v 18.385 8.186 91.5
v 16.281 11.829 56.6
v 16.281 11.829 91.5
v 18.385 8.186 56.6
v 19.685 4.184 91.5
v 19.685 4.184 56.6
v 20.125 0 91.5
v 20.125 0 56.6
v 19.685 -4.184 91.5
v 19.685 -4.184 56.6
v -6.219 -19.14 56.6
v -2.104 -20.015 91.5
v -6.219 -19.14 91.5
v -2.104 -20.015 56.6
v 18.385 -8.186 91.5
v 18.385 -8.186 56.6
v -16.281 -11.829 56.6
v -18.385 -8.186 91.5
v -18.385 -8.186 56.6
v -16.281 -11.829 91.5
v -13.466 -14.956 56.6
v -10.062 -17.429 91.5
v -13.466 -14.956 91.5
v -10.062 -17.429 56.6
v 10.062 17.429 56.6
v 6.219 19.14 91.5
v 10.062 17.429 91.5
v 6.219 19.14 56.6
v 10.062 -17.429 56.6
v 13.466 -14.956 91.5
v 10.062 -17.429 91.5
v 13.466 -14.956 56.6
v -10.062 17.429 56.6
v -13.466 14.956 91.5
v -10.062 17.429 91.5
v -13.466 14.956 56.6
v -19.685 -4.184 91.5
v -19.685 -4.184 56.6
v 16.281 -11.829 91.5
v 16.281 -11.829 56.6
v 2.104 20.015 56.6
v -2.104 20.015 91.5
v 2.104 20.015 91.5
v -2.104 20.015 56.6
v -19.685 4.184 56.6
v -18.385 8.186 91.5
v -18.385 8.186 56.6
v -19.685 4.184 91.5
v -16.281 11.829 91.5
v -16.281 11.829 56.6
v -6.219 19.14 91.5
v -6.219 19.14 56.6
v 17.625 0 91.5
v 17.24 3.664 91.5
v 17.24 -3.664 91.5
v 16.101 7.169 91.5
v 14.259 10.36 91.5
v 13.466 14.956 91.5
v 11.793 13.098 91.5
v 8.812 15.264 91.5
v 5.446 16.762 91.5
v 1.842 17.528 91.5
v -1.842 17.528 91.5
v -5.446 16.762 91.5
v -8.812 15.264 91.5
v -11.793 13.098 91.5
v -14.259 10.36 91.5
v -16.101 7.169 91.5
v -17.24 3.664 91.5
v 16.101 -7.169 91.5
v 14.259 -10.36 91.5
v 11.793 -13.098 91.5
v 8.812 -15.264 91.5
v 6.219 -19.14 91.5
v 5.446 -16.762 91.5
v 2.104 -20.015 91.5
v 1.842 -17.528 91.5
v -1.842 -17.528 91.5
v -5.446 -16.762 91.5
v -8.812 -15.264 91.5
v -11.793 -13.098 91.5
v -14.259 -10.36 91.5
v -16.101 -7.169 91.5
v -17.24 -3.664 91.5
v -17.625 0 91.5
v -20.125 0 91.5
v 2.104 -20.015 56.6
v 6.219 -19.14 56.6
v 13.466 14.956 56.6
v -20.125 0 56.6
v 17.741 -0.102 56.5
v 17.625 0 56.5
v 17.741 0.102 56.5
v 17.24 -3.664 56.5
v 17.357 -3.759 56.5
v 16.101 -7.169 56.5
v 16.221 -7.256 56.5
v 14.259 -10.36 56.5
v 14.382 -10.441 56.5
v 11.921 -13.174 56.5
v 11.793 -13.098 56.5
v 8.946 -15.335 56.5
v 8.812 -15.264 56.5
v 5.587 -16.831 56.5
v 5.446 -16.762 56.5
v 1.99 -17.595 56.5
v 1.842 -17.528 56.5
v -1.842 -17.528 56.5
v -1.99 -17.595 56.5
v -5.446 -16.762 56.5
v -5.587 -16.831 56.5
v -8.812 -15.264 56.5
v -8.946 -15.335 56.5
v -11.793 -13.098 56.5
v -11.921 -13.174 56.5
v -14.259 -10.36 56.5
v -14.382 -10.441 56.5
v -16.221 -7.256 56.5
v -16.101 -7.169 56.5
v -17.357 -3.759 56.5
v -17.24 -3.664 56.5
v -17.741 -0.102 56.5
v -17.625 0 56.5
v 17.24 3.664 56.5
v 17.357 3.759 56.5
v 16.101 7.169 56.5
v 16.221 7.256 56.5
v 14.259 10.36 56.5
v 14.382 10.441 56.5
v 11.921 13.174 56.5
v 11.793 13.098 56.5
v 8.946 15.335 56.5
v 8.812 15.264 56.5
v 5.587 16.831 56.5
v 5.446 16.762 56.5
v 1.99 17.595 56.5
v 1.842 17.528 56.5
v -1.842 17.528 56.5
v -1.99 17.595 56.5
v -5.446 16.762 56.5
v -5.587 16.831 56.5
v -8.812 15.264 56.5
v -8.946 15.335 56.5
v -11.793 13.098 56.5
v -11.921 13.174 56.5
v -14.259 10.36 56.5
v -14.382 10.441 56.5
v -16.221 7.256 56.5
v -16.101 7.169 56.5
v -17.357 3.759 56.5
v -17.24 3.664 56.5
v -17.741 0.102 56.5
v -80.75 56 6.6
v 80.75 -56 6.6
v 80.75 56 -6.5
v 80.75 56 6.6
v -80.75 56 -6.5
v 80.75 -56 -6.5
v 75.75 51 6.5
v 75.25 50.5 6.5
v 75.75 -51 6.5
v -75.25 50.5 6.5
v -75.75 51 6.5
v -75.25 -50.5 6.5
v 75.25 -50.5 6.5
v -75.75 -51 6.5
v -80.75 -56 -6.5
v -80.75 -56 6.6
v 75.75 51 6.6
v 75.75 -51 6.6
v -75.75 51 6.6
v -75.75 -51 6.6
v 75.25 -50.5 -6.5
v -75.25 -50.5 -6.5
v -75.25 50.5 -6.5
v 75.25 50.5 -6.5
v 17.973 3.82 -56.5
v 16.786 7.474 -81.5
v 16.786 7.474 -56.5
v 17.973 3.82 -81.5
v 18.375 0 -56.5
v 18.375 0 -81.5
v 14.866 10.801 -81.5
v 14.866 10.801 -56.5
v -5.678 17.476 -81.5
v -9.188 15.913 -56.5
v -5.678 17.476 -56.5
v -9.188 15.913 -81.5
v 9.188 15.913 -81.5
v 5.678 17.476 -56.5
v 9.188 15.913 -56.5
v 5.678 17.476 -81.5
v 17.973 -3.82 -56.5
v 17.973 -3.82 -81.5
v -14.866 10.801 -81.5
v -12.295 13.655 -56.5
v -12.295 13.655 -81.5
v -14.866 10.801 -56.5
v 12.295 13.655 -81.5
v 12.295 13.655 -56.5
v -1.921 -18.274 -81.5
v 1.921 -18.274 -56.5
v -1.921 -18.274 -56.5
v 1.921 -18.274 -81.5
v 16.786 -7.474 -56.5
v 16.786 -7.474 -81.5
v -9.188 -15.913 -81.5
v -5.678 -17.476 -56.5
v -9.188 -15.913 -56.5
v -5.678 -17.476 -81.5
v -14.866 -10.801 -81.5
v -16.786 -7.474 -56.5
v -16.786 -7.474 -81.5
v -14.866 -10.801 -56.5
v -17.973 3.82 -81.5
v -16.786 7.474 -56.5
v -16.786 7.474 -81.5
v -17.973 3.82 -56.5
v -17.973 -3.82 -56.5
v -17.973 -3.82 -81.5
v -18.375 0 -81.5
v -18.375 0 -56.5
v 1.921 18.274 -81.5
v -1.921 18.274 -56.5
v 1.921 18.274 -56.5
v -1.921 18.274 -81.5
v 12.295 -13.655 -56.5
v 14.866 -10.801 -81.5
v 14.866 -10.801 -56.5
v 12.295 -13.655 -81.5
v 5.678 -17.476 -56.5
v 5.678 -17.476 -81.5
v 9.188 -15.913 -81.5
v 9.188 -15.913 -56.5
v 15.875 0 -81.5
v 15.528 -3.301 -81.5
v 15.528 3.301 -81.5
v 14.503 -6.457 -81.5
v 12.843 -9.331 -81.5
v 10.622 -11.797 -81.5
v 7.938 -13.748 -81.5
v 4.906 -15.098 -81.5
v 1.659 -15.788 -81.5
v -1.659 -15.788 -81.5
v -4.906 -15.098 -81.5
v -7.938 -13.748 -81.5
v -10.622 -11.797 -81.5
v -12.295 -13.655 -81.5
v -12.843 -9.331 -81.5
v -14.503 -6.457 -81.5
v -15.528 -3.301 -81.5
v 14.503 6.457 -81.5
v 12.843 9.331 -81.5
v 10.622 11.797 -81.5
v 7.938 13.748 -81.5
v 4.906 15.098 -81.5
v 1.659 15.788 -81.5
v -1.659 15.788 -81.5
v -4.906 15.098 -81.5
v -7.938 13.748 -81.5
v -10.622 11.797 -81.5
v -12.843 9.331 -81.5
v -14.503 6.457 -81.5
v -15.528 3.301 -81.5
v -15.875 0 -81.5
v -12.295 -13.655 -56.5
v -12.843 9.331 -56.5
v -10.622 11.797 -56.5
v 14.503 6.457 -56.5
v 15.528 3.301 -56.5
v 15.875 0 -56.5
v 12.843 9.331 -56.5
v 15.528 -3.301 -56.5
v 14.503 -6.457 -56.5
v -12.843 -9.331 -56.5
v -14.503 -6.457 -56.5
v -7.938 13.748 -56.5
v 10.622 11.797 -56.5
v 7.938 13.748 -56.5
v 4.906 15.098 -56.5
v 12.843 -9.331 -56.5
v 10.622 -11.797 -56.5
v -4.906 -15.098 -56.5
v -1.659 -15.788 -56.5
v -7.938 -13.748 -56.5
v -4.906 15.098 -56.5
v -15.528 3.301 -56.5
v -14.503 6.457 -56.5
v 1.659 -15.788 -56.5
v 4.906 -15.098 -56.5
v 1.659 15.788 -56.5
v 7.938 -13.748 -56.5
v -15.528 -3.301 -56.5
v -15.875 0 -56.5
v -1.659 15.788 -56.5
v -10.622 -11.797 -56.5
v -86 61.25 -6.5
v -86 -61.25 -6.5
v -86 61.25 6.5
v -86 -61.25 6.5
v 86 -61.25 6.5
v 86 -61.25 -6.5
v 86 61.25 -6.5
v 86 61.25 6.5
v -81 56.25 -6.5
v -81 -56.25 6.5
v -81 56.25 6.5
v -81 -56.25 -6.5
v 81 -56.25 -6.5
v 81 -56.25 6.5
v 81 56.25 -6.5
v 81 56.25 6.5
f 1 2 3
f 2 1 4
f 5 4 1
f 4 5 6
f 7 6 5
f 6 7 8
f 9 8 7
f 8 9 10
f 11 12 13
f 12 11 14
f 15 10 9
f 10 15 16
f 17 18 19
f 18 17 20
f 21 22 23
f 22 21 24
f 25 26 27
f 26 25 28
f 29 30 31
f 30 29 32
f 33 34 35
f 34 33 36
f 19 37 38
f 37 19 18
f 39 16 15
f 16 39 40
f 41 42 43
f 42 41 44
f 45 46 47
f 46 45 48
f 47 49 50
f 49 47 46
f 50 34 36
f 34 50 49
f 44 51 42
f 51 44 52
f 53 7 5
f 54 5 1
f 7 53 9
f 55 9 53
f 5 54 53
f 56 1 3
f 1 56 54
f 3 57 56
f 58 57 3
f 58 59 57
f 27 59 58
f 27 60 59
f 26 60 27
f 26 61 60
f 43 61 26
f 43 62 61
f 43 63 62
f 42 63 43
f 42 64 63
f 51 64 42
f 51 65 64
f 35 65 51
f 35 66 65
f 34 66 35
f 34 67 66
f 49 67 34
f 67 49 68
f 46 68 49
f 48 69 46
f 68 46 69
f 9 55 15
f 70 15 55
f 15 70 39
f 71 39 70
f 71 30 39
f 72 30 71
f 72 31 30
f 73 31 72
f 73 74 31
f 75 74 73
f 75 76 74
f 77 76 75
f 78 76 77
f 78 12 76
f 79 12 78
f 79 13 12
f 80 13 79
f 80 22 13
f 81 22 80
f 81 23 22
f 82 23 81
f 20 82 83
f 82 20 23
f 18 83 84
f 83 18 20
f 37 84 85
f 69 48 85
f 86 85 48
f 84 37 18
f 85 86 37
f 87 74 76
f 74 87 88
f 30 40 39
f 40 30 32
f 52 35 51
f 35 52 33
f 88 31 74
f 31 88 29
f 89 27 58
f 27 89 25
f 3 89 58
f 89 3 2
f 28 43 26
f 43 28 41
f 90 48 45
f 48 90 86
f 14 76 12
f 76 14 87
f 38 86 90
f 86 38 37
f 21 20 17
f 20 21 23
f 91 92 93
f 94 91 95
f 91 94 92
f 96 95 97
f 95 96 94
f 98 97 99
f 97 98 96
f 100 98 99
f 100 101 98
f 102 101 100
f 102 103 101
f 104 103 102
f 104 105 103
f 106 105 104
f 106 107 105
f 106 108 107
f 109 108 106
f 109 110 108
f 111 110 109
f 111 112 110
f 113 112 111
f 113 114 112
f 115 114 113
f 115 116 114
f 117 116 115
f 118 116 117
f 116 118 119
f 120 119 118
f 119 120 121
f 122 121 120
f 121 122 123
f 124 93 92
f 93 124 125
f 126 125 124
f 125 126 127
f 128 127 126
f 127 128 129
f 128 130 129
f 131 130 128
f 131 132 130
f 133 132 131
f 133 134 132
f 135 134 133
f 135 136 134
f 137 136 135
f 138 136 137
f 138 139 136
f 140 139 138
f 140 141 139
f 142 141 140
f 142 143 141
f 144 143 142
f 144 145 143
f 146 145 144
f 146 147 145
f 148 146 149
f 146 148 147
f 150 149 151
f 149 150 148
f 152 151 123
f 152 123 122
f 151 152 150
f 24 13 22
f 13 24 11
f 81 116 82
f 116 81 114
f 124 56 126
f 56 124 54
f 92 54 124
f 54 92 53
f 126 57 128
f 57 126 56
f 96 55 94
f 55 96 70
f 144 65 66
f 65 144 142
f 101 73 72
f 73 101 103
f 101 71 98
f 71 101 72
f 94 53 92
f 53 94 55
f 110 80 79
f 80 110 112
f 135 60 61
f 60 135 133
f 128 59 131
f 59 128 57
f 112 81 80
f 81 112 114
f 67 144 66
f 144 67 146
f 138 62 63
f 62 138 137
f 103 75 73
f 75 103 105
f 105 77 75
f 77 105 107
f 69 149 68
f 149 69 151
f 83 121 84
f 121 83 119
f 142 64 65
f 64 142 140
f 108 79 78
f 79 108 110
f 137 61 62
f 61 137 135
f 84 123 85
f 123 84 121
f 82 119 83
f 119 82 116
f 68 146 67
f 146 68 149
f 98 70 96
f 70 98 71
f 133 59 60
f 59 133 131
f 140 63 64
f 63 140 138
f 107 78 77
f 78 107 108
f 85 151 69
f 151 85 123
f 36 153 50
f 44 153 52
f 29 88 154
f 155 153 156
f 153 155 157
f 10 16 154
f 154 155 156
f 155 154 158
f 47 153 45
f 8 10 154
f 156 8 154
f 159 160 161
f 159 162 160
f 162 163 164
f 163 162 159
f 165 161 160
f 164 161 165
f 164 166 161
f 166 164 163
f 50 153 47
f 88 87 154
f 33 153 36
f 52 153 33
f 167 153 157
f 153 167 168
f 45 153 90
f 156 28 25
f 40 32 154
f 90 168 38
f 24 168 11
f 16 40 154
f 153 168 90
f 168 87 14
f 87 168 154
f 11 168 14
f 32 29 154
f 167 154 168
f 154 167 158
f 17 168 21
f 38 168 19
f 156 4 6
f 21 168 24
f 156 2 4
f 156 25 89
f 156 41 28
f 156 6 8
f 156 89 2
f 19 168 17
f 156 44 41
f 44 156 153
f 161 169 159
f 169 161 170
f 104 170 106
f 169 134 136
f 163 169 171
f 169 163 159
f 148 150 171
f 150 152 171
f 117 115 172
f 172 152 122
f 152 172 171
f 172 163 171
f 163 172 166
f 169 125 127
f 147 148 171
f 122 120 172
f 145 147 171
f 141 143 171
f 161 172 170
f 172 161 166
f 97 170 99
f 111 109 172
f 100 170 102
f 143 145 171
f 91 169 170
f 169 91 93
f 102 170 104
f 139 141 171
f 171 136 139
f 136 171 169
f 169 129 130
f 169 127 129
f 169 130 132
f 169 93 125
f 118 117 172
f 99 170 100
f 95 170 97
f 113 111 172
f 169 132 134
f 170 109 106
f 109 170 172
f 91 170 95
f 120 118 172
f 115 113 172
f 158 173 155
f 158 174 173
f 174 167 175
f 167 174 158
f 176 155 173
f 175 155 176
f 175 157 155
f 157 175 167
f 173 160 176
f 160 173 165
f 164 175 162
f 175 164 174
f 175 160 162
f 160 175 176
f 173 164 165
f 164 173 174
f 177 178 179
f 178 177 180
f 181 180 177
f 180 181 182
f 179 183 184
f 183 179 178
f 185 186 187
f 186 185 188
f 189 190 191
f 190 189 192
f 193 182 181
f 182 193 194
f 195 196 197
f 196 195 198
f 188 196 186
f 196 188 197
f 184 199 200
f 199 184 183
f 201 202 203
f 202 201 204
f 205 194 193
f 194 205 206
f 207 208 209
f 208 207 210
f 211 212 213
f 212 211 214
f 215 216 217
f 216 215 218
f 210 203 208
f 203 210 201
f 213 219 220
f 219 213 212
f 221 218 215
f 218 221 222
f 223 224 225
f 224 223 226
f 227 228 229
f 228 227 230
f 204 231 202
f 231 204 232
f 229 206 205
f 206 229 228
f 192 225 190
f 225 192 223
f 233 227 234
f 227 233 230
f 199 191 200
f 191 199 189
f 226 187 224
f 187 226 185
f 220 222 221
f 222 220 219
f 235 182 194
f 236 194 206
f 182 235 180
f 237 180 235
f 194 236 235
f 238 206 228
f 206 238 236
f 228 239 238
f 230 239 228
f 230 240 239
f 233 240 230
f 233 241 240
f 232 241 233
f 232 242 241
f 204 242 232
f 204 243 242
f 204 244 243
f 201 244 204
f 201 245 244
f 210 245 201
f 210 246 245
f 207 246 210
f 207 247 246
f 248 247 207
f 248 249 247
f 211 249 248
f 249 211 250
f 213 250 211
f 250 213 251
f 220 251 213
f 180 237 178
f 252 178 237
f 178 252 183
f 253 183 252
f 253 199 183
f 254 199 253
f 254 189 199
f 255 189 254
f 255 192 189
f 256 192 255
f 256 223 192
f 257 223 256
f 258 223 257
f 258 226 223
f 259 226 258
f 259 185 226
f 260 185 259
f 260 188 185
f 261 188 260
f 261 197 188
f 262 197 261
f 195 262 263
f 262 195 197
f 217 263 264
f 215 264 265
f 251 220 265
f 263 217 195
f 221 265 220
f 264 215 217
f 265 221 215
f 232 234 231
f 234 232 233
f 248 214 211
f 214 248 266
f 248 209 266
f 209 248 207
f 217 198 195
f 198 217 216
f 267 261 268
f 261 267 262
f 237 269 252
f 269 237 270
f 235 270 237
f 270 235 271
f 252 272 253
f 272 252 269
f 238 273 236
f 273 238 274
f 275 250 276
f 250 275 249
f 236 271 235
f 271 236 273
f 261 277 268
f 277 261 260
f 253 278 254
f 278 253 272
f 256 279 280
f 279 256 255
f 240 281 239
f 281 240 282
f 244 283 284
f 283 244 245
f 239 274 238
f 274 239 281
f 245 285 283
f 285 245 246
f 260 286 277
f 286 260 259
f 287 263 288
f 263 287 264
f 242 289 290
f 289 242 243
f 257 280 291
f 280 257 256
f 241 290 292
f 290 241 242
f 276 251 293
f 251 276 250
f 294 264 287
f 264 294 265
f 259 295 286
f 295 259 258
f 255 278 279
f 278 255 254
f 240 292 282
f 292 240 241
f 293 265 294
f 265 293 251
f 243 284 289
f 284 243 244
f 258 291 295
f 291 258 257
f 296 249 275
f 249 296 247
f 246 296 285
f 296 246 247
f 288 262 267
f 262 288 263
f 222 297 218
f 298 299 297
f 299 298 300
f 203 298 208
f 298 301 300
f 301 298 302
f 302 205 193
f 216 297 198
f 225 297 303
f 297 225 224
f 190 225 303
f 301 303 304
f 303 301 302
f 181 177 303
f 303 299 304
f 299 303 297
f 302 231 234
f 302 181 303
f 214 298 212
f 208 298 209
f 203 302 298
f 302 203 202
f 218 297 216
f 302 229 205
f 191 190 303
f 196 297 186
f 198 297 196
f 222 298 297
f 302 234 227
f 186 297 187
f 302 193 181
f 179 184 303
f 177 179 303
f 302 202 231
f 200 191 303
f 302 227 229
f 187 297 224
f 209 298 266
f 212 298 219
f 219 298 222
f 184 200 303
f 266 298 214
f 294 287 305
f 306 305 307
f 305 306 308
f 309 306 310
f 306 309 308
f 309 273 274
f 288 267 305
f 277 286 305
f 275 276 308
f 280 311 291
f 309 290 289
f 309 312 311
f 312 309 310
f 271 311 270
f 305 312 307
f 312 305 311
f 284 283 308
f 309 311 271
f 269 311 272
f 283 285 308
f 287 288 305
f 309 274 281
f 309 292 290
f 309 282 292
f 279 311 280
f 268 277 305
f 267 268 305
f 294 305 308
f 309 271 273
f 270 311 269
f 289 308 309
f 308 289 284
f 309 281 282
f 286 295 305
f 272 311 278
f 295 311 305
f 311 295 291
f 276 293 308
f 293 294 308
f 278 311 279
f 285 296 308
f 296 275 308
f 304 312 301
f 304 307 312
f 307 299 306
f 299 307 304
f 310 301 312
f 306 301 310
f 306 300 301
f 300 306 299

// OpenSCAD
// my second parametric OpenSCAD project, making a
// filter holder for a dust collection vacuum hose
// set the inlet and outlet diameters, use 45 degree slope
// to provide easy no-supports printing
render_filter_cube = false;
render_inlet = true;
render_outlet = true;
filter_length = 150.5;
filter_width = 101;
filter_thickness = 13;
wall_thickness = 5;
gap_for_filter_length = 1;
gap_for_filter_width = 1;
length_of_transition_on_inlet = 50; // non-zero or it won't render
length_of_transition_on_outlet = 50; // non-zero or it won't render
gap_between_input_and_output = 0.5;

inlet_outer_dia = 40.25;
inlet_inner_dia = 35.25;
inlet_length = 35;
outlet_outer_dia = 36.75;
outlet_inner_dia = 31.75;
outlet_length = 25;

inlet_outer_radius = inlet_outer_dia / 2.0;
inlet_inner_radius = inlet_inner_dia / 2.0;
outlet_outer_radius = outlet_outer_dia / 2.0;
outlet_inner_radius = outlet_inner_dia / 2.0;
// calculate the wall angle so it can be made thicker to compensate for the slope
filter_length_opening = filter_length + gap_for_filter_length;
filter_width_opening = filter_width + gap_for_filter_width;
inlet_surround_length = filter_length_opening + 2*wall_thickness;
inlet_surround_width = filter_width_opening + 2*wall_thickness;
inlet_surround_height = filter_thickness;
inlet_side_length = filter_length_opening + 2*wall_thickness;
inlet_side_width = filter_width_opening + 2*wall_thickness;
outlet_side_length = inlet_side_length + gap_between_input_and_output;
outlet_side_width = inlet_side_width + gap_between_input_and_output;
outlet_outside_length = outlet_side_length + 2*wall_thickness;
outlet_outside_width = outlet_side_width + 2*wall_thickness;
outlet_surround_height = filter_thickness;
// slope_ratio gives the z distance traveled for a given
// distance change in the x/y directions

if (render_filter_cube) {
    translate([-0.5*filter_length,-0.5*filter_width,-0.5*filter_thickness]) cube([filter_length,filter_width,filter_thickness]);
}

if (render_inlet) {
    // inlet
    translate([0, 0, (length_of_transition_on_inlet + filter_thickness/2)]) {
        difference() {
            cylinder(inlet_length, inlet_outer_radius, inlet_outer_radius);
            cylinder(inlet_length, inlet_inner_radius, inlet_inner_radius);
        }
    }
    // transition to filter
    translate([0,0,(filter_thickness/2)])
    difference() {
        hull() {
            translate([-0.5*inlet_side_length,-0.5*inlet_side_width,0]) cube([inlet_side_length,inlet_side_width,.1]);
            translate([0,0,length_of_transition_on_inlet]) cylinder(r=inlet_outer_radius,h=0.1);
        }
        hull() {
            translate([-0.5*filter_length_opening,-0.5*filter_width_opening,0]) cube([filter_length_opening,filter_width_opening,.1]);
            translate([0,0,length_of_transition_on_inlet]) cylinder(r=inlet_inner_radius,h=0.1);
        }
    }
    // surround the filter
    difference() {
        translate([-0.5*inlet_surround_length,-0.5*inlet_surround_width,-0.5*filter_thickness]) cube([inlet_surround_length,inlet_surround_width,inlet_surround_height]);
        translate([-0.5*filter_length,-0.5*filter_width,-0.5*filter_thickness]) cube([filter_length,filter_width,filter_thickness]);
    }
}

if (render_outlet) {
    translate([0, 0, 0]) {
        // outlet
        translate([0, 0, (-1.0 * (outlet_length+length_of_transition_on_outlet+0.5*filter_thickness))]) {
            difference() {
                cylinder(outlet_length, outlet_outer_radius, outlet_outer_radius);
                cylinder(outlet_length, outlet_inner_radius, outlet_inner_radius);
            }
        }    
        // transition to filter
        translate([0,0,(-1*filter_thickness/2)])
        difference() {
            hull() {
                translate([-0.5*outlet_outside_length,-0.5*outlet_outside_width,0]) cube([outlet_outside_length,outlet_outside_width,.1]);
                translate([0,0,-1*length_of_transition_on_outlet]) cylinder(r=outlet_outer_radius,h=0.1);
            }
            hull() {
                translate([-0.5*outlet_side_length,-0.5*outlet_side_width,0]) cube([outlet_side_length,outlet_side_width,.1]);
                translate([0,0,-1*length_of_transition_on_outlet]) cylinder(r=outlet_inner_radius,h=0.1);
            }
        }
        // surround the filter
        difference() {
            translate([-0.5*outlet_outside_length,-0.5*outlet_outside_width,-0.5*filter_thickness]) cube([outlet_outside_length,outlet_outside_width,outlet_surround_height]);
            translate([-0.5*outlet_side_length,-0.5*outlet_side_width,-0.5*filter_thickness]) cube([outlet_side_length,outlet_side_width,outlet_surround_height]);
        }
    }
}
